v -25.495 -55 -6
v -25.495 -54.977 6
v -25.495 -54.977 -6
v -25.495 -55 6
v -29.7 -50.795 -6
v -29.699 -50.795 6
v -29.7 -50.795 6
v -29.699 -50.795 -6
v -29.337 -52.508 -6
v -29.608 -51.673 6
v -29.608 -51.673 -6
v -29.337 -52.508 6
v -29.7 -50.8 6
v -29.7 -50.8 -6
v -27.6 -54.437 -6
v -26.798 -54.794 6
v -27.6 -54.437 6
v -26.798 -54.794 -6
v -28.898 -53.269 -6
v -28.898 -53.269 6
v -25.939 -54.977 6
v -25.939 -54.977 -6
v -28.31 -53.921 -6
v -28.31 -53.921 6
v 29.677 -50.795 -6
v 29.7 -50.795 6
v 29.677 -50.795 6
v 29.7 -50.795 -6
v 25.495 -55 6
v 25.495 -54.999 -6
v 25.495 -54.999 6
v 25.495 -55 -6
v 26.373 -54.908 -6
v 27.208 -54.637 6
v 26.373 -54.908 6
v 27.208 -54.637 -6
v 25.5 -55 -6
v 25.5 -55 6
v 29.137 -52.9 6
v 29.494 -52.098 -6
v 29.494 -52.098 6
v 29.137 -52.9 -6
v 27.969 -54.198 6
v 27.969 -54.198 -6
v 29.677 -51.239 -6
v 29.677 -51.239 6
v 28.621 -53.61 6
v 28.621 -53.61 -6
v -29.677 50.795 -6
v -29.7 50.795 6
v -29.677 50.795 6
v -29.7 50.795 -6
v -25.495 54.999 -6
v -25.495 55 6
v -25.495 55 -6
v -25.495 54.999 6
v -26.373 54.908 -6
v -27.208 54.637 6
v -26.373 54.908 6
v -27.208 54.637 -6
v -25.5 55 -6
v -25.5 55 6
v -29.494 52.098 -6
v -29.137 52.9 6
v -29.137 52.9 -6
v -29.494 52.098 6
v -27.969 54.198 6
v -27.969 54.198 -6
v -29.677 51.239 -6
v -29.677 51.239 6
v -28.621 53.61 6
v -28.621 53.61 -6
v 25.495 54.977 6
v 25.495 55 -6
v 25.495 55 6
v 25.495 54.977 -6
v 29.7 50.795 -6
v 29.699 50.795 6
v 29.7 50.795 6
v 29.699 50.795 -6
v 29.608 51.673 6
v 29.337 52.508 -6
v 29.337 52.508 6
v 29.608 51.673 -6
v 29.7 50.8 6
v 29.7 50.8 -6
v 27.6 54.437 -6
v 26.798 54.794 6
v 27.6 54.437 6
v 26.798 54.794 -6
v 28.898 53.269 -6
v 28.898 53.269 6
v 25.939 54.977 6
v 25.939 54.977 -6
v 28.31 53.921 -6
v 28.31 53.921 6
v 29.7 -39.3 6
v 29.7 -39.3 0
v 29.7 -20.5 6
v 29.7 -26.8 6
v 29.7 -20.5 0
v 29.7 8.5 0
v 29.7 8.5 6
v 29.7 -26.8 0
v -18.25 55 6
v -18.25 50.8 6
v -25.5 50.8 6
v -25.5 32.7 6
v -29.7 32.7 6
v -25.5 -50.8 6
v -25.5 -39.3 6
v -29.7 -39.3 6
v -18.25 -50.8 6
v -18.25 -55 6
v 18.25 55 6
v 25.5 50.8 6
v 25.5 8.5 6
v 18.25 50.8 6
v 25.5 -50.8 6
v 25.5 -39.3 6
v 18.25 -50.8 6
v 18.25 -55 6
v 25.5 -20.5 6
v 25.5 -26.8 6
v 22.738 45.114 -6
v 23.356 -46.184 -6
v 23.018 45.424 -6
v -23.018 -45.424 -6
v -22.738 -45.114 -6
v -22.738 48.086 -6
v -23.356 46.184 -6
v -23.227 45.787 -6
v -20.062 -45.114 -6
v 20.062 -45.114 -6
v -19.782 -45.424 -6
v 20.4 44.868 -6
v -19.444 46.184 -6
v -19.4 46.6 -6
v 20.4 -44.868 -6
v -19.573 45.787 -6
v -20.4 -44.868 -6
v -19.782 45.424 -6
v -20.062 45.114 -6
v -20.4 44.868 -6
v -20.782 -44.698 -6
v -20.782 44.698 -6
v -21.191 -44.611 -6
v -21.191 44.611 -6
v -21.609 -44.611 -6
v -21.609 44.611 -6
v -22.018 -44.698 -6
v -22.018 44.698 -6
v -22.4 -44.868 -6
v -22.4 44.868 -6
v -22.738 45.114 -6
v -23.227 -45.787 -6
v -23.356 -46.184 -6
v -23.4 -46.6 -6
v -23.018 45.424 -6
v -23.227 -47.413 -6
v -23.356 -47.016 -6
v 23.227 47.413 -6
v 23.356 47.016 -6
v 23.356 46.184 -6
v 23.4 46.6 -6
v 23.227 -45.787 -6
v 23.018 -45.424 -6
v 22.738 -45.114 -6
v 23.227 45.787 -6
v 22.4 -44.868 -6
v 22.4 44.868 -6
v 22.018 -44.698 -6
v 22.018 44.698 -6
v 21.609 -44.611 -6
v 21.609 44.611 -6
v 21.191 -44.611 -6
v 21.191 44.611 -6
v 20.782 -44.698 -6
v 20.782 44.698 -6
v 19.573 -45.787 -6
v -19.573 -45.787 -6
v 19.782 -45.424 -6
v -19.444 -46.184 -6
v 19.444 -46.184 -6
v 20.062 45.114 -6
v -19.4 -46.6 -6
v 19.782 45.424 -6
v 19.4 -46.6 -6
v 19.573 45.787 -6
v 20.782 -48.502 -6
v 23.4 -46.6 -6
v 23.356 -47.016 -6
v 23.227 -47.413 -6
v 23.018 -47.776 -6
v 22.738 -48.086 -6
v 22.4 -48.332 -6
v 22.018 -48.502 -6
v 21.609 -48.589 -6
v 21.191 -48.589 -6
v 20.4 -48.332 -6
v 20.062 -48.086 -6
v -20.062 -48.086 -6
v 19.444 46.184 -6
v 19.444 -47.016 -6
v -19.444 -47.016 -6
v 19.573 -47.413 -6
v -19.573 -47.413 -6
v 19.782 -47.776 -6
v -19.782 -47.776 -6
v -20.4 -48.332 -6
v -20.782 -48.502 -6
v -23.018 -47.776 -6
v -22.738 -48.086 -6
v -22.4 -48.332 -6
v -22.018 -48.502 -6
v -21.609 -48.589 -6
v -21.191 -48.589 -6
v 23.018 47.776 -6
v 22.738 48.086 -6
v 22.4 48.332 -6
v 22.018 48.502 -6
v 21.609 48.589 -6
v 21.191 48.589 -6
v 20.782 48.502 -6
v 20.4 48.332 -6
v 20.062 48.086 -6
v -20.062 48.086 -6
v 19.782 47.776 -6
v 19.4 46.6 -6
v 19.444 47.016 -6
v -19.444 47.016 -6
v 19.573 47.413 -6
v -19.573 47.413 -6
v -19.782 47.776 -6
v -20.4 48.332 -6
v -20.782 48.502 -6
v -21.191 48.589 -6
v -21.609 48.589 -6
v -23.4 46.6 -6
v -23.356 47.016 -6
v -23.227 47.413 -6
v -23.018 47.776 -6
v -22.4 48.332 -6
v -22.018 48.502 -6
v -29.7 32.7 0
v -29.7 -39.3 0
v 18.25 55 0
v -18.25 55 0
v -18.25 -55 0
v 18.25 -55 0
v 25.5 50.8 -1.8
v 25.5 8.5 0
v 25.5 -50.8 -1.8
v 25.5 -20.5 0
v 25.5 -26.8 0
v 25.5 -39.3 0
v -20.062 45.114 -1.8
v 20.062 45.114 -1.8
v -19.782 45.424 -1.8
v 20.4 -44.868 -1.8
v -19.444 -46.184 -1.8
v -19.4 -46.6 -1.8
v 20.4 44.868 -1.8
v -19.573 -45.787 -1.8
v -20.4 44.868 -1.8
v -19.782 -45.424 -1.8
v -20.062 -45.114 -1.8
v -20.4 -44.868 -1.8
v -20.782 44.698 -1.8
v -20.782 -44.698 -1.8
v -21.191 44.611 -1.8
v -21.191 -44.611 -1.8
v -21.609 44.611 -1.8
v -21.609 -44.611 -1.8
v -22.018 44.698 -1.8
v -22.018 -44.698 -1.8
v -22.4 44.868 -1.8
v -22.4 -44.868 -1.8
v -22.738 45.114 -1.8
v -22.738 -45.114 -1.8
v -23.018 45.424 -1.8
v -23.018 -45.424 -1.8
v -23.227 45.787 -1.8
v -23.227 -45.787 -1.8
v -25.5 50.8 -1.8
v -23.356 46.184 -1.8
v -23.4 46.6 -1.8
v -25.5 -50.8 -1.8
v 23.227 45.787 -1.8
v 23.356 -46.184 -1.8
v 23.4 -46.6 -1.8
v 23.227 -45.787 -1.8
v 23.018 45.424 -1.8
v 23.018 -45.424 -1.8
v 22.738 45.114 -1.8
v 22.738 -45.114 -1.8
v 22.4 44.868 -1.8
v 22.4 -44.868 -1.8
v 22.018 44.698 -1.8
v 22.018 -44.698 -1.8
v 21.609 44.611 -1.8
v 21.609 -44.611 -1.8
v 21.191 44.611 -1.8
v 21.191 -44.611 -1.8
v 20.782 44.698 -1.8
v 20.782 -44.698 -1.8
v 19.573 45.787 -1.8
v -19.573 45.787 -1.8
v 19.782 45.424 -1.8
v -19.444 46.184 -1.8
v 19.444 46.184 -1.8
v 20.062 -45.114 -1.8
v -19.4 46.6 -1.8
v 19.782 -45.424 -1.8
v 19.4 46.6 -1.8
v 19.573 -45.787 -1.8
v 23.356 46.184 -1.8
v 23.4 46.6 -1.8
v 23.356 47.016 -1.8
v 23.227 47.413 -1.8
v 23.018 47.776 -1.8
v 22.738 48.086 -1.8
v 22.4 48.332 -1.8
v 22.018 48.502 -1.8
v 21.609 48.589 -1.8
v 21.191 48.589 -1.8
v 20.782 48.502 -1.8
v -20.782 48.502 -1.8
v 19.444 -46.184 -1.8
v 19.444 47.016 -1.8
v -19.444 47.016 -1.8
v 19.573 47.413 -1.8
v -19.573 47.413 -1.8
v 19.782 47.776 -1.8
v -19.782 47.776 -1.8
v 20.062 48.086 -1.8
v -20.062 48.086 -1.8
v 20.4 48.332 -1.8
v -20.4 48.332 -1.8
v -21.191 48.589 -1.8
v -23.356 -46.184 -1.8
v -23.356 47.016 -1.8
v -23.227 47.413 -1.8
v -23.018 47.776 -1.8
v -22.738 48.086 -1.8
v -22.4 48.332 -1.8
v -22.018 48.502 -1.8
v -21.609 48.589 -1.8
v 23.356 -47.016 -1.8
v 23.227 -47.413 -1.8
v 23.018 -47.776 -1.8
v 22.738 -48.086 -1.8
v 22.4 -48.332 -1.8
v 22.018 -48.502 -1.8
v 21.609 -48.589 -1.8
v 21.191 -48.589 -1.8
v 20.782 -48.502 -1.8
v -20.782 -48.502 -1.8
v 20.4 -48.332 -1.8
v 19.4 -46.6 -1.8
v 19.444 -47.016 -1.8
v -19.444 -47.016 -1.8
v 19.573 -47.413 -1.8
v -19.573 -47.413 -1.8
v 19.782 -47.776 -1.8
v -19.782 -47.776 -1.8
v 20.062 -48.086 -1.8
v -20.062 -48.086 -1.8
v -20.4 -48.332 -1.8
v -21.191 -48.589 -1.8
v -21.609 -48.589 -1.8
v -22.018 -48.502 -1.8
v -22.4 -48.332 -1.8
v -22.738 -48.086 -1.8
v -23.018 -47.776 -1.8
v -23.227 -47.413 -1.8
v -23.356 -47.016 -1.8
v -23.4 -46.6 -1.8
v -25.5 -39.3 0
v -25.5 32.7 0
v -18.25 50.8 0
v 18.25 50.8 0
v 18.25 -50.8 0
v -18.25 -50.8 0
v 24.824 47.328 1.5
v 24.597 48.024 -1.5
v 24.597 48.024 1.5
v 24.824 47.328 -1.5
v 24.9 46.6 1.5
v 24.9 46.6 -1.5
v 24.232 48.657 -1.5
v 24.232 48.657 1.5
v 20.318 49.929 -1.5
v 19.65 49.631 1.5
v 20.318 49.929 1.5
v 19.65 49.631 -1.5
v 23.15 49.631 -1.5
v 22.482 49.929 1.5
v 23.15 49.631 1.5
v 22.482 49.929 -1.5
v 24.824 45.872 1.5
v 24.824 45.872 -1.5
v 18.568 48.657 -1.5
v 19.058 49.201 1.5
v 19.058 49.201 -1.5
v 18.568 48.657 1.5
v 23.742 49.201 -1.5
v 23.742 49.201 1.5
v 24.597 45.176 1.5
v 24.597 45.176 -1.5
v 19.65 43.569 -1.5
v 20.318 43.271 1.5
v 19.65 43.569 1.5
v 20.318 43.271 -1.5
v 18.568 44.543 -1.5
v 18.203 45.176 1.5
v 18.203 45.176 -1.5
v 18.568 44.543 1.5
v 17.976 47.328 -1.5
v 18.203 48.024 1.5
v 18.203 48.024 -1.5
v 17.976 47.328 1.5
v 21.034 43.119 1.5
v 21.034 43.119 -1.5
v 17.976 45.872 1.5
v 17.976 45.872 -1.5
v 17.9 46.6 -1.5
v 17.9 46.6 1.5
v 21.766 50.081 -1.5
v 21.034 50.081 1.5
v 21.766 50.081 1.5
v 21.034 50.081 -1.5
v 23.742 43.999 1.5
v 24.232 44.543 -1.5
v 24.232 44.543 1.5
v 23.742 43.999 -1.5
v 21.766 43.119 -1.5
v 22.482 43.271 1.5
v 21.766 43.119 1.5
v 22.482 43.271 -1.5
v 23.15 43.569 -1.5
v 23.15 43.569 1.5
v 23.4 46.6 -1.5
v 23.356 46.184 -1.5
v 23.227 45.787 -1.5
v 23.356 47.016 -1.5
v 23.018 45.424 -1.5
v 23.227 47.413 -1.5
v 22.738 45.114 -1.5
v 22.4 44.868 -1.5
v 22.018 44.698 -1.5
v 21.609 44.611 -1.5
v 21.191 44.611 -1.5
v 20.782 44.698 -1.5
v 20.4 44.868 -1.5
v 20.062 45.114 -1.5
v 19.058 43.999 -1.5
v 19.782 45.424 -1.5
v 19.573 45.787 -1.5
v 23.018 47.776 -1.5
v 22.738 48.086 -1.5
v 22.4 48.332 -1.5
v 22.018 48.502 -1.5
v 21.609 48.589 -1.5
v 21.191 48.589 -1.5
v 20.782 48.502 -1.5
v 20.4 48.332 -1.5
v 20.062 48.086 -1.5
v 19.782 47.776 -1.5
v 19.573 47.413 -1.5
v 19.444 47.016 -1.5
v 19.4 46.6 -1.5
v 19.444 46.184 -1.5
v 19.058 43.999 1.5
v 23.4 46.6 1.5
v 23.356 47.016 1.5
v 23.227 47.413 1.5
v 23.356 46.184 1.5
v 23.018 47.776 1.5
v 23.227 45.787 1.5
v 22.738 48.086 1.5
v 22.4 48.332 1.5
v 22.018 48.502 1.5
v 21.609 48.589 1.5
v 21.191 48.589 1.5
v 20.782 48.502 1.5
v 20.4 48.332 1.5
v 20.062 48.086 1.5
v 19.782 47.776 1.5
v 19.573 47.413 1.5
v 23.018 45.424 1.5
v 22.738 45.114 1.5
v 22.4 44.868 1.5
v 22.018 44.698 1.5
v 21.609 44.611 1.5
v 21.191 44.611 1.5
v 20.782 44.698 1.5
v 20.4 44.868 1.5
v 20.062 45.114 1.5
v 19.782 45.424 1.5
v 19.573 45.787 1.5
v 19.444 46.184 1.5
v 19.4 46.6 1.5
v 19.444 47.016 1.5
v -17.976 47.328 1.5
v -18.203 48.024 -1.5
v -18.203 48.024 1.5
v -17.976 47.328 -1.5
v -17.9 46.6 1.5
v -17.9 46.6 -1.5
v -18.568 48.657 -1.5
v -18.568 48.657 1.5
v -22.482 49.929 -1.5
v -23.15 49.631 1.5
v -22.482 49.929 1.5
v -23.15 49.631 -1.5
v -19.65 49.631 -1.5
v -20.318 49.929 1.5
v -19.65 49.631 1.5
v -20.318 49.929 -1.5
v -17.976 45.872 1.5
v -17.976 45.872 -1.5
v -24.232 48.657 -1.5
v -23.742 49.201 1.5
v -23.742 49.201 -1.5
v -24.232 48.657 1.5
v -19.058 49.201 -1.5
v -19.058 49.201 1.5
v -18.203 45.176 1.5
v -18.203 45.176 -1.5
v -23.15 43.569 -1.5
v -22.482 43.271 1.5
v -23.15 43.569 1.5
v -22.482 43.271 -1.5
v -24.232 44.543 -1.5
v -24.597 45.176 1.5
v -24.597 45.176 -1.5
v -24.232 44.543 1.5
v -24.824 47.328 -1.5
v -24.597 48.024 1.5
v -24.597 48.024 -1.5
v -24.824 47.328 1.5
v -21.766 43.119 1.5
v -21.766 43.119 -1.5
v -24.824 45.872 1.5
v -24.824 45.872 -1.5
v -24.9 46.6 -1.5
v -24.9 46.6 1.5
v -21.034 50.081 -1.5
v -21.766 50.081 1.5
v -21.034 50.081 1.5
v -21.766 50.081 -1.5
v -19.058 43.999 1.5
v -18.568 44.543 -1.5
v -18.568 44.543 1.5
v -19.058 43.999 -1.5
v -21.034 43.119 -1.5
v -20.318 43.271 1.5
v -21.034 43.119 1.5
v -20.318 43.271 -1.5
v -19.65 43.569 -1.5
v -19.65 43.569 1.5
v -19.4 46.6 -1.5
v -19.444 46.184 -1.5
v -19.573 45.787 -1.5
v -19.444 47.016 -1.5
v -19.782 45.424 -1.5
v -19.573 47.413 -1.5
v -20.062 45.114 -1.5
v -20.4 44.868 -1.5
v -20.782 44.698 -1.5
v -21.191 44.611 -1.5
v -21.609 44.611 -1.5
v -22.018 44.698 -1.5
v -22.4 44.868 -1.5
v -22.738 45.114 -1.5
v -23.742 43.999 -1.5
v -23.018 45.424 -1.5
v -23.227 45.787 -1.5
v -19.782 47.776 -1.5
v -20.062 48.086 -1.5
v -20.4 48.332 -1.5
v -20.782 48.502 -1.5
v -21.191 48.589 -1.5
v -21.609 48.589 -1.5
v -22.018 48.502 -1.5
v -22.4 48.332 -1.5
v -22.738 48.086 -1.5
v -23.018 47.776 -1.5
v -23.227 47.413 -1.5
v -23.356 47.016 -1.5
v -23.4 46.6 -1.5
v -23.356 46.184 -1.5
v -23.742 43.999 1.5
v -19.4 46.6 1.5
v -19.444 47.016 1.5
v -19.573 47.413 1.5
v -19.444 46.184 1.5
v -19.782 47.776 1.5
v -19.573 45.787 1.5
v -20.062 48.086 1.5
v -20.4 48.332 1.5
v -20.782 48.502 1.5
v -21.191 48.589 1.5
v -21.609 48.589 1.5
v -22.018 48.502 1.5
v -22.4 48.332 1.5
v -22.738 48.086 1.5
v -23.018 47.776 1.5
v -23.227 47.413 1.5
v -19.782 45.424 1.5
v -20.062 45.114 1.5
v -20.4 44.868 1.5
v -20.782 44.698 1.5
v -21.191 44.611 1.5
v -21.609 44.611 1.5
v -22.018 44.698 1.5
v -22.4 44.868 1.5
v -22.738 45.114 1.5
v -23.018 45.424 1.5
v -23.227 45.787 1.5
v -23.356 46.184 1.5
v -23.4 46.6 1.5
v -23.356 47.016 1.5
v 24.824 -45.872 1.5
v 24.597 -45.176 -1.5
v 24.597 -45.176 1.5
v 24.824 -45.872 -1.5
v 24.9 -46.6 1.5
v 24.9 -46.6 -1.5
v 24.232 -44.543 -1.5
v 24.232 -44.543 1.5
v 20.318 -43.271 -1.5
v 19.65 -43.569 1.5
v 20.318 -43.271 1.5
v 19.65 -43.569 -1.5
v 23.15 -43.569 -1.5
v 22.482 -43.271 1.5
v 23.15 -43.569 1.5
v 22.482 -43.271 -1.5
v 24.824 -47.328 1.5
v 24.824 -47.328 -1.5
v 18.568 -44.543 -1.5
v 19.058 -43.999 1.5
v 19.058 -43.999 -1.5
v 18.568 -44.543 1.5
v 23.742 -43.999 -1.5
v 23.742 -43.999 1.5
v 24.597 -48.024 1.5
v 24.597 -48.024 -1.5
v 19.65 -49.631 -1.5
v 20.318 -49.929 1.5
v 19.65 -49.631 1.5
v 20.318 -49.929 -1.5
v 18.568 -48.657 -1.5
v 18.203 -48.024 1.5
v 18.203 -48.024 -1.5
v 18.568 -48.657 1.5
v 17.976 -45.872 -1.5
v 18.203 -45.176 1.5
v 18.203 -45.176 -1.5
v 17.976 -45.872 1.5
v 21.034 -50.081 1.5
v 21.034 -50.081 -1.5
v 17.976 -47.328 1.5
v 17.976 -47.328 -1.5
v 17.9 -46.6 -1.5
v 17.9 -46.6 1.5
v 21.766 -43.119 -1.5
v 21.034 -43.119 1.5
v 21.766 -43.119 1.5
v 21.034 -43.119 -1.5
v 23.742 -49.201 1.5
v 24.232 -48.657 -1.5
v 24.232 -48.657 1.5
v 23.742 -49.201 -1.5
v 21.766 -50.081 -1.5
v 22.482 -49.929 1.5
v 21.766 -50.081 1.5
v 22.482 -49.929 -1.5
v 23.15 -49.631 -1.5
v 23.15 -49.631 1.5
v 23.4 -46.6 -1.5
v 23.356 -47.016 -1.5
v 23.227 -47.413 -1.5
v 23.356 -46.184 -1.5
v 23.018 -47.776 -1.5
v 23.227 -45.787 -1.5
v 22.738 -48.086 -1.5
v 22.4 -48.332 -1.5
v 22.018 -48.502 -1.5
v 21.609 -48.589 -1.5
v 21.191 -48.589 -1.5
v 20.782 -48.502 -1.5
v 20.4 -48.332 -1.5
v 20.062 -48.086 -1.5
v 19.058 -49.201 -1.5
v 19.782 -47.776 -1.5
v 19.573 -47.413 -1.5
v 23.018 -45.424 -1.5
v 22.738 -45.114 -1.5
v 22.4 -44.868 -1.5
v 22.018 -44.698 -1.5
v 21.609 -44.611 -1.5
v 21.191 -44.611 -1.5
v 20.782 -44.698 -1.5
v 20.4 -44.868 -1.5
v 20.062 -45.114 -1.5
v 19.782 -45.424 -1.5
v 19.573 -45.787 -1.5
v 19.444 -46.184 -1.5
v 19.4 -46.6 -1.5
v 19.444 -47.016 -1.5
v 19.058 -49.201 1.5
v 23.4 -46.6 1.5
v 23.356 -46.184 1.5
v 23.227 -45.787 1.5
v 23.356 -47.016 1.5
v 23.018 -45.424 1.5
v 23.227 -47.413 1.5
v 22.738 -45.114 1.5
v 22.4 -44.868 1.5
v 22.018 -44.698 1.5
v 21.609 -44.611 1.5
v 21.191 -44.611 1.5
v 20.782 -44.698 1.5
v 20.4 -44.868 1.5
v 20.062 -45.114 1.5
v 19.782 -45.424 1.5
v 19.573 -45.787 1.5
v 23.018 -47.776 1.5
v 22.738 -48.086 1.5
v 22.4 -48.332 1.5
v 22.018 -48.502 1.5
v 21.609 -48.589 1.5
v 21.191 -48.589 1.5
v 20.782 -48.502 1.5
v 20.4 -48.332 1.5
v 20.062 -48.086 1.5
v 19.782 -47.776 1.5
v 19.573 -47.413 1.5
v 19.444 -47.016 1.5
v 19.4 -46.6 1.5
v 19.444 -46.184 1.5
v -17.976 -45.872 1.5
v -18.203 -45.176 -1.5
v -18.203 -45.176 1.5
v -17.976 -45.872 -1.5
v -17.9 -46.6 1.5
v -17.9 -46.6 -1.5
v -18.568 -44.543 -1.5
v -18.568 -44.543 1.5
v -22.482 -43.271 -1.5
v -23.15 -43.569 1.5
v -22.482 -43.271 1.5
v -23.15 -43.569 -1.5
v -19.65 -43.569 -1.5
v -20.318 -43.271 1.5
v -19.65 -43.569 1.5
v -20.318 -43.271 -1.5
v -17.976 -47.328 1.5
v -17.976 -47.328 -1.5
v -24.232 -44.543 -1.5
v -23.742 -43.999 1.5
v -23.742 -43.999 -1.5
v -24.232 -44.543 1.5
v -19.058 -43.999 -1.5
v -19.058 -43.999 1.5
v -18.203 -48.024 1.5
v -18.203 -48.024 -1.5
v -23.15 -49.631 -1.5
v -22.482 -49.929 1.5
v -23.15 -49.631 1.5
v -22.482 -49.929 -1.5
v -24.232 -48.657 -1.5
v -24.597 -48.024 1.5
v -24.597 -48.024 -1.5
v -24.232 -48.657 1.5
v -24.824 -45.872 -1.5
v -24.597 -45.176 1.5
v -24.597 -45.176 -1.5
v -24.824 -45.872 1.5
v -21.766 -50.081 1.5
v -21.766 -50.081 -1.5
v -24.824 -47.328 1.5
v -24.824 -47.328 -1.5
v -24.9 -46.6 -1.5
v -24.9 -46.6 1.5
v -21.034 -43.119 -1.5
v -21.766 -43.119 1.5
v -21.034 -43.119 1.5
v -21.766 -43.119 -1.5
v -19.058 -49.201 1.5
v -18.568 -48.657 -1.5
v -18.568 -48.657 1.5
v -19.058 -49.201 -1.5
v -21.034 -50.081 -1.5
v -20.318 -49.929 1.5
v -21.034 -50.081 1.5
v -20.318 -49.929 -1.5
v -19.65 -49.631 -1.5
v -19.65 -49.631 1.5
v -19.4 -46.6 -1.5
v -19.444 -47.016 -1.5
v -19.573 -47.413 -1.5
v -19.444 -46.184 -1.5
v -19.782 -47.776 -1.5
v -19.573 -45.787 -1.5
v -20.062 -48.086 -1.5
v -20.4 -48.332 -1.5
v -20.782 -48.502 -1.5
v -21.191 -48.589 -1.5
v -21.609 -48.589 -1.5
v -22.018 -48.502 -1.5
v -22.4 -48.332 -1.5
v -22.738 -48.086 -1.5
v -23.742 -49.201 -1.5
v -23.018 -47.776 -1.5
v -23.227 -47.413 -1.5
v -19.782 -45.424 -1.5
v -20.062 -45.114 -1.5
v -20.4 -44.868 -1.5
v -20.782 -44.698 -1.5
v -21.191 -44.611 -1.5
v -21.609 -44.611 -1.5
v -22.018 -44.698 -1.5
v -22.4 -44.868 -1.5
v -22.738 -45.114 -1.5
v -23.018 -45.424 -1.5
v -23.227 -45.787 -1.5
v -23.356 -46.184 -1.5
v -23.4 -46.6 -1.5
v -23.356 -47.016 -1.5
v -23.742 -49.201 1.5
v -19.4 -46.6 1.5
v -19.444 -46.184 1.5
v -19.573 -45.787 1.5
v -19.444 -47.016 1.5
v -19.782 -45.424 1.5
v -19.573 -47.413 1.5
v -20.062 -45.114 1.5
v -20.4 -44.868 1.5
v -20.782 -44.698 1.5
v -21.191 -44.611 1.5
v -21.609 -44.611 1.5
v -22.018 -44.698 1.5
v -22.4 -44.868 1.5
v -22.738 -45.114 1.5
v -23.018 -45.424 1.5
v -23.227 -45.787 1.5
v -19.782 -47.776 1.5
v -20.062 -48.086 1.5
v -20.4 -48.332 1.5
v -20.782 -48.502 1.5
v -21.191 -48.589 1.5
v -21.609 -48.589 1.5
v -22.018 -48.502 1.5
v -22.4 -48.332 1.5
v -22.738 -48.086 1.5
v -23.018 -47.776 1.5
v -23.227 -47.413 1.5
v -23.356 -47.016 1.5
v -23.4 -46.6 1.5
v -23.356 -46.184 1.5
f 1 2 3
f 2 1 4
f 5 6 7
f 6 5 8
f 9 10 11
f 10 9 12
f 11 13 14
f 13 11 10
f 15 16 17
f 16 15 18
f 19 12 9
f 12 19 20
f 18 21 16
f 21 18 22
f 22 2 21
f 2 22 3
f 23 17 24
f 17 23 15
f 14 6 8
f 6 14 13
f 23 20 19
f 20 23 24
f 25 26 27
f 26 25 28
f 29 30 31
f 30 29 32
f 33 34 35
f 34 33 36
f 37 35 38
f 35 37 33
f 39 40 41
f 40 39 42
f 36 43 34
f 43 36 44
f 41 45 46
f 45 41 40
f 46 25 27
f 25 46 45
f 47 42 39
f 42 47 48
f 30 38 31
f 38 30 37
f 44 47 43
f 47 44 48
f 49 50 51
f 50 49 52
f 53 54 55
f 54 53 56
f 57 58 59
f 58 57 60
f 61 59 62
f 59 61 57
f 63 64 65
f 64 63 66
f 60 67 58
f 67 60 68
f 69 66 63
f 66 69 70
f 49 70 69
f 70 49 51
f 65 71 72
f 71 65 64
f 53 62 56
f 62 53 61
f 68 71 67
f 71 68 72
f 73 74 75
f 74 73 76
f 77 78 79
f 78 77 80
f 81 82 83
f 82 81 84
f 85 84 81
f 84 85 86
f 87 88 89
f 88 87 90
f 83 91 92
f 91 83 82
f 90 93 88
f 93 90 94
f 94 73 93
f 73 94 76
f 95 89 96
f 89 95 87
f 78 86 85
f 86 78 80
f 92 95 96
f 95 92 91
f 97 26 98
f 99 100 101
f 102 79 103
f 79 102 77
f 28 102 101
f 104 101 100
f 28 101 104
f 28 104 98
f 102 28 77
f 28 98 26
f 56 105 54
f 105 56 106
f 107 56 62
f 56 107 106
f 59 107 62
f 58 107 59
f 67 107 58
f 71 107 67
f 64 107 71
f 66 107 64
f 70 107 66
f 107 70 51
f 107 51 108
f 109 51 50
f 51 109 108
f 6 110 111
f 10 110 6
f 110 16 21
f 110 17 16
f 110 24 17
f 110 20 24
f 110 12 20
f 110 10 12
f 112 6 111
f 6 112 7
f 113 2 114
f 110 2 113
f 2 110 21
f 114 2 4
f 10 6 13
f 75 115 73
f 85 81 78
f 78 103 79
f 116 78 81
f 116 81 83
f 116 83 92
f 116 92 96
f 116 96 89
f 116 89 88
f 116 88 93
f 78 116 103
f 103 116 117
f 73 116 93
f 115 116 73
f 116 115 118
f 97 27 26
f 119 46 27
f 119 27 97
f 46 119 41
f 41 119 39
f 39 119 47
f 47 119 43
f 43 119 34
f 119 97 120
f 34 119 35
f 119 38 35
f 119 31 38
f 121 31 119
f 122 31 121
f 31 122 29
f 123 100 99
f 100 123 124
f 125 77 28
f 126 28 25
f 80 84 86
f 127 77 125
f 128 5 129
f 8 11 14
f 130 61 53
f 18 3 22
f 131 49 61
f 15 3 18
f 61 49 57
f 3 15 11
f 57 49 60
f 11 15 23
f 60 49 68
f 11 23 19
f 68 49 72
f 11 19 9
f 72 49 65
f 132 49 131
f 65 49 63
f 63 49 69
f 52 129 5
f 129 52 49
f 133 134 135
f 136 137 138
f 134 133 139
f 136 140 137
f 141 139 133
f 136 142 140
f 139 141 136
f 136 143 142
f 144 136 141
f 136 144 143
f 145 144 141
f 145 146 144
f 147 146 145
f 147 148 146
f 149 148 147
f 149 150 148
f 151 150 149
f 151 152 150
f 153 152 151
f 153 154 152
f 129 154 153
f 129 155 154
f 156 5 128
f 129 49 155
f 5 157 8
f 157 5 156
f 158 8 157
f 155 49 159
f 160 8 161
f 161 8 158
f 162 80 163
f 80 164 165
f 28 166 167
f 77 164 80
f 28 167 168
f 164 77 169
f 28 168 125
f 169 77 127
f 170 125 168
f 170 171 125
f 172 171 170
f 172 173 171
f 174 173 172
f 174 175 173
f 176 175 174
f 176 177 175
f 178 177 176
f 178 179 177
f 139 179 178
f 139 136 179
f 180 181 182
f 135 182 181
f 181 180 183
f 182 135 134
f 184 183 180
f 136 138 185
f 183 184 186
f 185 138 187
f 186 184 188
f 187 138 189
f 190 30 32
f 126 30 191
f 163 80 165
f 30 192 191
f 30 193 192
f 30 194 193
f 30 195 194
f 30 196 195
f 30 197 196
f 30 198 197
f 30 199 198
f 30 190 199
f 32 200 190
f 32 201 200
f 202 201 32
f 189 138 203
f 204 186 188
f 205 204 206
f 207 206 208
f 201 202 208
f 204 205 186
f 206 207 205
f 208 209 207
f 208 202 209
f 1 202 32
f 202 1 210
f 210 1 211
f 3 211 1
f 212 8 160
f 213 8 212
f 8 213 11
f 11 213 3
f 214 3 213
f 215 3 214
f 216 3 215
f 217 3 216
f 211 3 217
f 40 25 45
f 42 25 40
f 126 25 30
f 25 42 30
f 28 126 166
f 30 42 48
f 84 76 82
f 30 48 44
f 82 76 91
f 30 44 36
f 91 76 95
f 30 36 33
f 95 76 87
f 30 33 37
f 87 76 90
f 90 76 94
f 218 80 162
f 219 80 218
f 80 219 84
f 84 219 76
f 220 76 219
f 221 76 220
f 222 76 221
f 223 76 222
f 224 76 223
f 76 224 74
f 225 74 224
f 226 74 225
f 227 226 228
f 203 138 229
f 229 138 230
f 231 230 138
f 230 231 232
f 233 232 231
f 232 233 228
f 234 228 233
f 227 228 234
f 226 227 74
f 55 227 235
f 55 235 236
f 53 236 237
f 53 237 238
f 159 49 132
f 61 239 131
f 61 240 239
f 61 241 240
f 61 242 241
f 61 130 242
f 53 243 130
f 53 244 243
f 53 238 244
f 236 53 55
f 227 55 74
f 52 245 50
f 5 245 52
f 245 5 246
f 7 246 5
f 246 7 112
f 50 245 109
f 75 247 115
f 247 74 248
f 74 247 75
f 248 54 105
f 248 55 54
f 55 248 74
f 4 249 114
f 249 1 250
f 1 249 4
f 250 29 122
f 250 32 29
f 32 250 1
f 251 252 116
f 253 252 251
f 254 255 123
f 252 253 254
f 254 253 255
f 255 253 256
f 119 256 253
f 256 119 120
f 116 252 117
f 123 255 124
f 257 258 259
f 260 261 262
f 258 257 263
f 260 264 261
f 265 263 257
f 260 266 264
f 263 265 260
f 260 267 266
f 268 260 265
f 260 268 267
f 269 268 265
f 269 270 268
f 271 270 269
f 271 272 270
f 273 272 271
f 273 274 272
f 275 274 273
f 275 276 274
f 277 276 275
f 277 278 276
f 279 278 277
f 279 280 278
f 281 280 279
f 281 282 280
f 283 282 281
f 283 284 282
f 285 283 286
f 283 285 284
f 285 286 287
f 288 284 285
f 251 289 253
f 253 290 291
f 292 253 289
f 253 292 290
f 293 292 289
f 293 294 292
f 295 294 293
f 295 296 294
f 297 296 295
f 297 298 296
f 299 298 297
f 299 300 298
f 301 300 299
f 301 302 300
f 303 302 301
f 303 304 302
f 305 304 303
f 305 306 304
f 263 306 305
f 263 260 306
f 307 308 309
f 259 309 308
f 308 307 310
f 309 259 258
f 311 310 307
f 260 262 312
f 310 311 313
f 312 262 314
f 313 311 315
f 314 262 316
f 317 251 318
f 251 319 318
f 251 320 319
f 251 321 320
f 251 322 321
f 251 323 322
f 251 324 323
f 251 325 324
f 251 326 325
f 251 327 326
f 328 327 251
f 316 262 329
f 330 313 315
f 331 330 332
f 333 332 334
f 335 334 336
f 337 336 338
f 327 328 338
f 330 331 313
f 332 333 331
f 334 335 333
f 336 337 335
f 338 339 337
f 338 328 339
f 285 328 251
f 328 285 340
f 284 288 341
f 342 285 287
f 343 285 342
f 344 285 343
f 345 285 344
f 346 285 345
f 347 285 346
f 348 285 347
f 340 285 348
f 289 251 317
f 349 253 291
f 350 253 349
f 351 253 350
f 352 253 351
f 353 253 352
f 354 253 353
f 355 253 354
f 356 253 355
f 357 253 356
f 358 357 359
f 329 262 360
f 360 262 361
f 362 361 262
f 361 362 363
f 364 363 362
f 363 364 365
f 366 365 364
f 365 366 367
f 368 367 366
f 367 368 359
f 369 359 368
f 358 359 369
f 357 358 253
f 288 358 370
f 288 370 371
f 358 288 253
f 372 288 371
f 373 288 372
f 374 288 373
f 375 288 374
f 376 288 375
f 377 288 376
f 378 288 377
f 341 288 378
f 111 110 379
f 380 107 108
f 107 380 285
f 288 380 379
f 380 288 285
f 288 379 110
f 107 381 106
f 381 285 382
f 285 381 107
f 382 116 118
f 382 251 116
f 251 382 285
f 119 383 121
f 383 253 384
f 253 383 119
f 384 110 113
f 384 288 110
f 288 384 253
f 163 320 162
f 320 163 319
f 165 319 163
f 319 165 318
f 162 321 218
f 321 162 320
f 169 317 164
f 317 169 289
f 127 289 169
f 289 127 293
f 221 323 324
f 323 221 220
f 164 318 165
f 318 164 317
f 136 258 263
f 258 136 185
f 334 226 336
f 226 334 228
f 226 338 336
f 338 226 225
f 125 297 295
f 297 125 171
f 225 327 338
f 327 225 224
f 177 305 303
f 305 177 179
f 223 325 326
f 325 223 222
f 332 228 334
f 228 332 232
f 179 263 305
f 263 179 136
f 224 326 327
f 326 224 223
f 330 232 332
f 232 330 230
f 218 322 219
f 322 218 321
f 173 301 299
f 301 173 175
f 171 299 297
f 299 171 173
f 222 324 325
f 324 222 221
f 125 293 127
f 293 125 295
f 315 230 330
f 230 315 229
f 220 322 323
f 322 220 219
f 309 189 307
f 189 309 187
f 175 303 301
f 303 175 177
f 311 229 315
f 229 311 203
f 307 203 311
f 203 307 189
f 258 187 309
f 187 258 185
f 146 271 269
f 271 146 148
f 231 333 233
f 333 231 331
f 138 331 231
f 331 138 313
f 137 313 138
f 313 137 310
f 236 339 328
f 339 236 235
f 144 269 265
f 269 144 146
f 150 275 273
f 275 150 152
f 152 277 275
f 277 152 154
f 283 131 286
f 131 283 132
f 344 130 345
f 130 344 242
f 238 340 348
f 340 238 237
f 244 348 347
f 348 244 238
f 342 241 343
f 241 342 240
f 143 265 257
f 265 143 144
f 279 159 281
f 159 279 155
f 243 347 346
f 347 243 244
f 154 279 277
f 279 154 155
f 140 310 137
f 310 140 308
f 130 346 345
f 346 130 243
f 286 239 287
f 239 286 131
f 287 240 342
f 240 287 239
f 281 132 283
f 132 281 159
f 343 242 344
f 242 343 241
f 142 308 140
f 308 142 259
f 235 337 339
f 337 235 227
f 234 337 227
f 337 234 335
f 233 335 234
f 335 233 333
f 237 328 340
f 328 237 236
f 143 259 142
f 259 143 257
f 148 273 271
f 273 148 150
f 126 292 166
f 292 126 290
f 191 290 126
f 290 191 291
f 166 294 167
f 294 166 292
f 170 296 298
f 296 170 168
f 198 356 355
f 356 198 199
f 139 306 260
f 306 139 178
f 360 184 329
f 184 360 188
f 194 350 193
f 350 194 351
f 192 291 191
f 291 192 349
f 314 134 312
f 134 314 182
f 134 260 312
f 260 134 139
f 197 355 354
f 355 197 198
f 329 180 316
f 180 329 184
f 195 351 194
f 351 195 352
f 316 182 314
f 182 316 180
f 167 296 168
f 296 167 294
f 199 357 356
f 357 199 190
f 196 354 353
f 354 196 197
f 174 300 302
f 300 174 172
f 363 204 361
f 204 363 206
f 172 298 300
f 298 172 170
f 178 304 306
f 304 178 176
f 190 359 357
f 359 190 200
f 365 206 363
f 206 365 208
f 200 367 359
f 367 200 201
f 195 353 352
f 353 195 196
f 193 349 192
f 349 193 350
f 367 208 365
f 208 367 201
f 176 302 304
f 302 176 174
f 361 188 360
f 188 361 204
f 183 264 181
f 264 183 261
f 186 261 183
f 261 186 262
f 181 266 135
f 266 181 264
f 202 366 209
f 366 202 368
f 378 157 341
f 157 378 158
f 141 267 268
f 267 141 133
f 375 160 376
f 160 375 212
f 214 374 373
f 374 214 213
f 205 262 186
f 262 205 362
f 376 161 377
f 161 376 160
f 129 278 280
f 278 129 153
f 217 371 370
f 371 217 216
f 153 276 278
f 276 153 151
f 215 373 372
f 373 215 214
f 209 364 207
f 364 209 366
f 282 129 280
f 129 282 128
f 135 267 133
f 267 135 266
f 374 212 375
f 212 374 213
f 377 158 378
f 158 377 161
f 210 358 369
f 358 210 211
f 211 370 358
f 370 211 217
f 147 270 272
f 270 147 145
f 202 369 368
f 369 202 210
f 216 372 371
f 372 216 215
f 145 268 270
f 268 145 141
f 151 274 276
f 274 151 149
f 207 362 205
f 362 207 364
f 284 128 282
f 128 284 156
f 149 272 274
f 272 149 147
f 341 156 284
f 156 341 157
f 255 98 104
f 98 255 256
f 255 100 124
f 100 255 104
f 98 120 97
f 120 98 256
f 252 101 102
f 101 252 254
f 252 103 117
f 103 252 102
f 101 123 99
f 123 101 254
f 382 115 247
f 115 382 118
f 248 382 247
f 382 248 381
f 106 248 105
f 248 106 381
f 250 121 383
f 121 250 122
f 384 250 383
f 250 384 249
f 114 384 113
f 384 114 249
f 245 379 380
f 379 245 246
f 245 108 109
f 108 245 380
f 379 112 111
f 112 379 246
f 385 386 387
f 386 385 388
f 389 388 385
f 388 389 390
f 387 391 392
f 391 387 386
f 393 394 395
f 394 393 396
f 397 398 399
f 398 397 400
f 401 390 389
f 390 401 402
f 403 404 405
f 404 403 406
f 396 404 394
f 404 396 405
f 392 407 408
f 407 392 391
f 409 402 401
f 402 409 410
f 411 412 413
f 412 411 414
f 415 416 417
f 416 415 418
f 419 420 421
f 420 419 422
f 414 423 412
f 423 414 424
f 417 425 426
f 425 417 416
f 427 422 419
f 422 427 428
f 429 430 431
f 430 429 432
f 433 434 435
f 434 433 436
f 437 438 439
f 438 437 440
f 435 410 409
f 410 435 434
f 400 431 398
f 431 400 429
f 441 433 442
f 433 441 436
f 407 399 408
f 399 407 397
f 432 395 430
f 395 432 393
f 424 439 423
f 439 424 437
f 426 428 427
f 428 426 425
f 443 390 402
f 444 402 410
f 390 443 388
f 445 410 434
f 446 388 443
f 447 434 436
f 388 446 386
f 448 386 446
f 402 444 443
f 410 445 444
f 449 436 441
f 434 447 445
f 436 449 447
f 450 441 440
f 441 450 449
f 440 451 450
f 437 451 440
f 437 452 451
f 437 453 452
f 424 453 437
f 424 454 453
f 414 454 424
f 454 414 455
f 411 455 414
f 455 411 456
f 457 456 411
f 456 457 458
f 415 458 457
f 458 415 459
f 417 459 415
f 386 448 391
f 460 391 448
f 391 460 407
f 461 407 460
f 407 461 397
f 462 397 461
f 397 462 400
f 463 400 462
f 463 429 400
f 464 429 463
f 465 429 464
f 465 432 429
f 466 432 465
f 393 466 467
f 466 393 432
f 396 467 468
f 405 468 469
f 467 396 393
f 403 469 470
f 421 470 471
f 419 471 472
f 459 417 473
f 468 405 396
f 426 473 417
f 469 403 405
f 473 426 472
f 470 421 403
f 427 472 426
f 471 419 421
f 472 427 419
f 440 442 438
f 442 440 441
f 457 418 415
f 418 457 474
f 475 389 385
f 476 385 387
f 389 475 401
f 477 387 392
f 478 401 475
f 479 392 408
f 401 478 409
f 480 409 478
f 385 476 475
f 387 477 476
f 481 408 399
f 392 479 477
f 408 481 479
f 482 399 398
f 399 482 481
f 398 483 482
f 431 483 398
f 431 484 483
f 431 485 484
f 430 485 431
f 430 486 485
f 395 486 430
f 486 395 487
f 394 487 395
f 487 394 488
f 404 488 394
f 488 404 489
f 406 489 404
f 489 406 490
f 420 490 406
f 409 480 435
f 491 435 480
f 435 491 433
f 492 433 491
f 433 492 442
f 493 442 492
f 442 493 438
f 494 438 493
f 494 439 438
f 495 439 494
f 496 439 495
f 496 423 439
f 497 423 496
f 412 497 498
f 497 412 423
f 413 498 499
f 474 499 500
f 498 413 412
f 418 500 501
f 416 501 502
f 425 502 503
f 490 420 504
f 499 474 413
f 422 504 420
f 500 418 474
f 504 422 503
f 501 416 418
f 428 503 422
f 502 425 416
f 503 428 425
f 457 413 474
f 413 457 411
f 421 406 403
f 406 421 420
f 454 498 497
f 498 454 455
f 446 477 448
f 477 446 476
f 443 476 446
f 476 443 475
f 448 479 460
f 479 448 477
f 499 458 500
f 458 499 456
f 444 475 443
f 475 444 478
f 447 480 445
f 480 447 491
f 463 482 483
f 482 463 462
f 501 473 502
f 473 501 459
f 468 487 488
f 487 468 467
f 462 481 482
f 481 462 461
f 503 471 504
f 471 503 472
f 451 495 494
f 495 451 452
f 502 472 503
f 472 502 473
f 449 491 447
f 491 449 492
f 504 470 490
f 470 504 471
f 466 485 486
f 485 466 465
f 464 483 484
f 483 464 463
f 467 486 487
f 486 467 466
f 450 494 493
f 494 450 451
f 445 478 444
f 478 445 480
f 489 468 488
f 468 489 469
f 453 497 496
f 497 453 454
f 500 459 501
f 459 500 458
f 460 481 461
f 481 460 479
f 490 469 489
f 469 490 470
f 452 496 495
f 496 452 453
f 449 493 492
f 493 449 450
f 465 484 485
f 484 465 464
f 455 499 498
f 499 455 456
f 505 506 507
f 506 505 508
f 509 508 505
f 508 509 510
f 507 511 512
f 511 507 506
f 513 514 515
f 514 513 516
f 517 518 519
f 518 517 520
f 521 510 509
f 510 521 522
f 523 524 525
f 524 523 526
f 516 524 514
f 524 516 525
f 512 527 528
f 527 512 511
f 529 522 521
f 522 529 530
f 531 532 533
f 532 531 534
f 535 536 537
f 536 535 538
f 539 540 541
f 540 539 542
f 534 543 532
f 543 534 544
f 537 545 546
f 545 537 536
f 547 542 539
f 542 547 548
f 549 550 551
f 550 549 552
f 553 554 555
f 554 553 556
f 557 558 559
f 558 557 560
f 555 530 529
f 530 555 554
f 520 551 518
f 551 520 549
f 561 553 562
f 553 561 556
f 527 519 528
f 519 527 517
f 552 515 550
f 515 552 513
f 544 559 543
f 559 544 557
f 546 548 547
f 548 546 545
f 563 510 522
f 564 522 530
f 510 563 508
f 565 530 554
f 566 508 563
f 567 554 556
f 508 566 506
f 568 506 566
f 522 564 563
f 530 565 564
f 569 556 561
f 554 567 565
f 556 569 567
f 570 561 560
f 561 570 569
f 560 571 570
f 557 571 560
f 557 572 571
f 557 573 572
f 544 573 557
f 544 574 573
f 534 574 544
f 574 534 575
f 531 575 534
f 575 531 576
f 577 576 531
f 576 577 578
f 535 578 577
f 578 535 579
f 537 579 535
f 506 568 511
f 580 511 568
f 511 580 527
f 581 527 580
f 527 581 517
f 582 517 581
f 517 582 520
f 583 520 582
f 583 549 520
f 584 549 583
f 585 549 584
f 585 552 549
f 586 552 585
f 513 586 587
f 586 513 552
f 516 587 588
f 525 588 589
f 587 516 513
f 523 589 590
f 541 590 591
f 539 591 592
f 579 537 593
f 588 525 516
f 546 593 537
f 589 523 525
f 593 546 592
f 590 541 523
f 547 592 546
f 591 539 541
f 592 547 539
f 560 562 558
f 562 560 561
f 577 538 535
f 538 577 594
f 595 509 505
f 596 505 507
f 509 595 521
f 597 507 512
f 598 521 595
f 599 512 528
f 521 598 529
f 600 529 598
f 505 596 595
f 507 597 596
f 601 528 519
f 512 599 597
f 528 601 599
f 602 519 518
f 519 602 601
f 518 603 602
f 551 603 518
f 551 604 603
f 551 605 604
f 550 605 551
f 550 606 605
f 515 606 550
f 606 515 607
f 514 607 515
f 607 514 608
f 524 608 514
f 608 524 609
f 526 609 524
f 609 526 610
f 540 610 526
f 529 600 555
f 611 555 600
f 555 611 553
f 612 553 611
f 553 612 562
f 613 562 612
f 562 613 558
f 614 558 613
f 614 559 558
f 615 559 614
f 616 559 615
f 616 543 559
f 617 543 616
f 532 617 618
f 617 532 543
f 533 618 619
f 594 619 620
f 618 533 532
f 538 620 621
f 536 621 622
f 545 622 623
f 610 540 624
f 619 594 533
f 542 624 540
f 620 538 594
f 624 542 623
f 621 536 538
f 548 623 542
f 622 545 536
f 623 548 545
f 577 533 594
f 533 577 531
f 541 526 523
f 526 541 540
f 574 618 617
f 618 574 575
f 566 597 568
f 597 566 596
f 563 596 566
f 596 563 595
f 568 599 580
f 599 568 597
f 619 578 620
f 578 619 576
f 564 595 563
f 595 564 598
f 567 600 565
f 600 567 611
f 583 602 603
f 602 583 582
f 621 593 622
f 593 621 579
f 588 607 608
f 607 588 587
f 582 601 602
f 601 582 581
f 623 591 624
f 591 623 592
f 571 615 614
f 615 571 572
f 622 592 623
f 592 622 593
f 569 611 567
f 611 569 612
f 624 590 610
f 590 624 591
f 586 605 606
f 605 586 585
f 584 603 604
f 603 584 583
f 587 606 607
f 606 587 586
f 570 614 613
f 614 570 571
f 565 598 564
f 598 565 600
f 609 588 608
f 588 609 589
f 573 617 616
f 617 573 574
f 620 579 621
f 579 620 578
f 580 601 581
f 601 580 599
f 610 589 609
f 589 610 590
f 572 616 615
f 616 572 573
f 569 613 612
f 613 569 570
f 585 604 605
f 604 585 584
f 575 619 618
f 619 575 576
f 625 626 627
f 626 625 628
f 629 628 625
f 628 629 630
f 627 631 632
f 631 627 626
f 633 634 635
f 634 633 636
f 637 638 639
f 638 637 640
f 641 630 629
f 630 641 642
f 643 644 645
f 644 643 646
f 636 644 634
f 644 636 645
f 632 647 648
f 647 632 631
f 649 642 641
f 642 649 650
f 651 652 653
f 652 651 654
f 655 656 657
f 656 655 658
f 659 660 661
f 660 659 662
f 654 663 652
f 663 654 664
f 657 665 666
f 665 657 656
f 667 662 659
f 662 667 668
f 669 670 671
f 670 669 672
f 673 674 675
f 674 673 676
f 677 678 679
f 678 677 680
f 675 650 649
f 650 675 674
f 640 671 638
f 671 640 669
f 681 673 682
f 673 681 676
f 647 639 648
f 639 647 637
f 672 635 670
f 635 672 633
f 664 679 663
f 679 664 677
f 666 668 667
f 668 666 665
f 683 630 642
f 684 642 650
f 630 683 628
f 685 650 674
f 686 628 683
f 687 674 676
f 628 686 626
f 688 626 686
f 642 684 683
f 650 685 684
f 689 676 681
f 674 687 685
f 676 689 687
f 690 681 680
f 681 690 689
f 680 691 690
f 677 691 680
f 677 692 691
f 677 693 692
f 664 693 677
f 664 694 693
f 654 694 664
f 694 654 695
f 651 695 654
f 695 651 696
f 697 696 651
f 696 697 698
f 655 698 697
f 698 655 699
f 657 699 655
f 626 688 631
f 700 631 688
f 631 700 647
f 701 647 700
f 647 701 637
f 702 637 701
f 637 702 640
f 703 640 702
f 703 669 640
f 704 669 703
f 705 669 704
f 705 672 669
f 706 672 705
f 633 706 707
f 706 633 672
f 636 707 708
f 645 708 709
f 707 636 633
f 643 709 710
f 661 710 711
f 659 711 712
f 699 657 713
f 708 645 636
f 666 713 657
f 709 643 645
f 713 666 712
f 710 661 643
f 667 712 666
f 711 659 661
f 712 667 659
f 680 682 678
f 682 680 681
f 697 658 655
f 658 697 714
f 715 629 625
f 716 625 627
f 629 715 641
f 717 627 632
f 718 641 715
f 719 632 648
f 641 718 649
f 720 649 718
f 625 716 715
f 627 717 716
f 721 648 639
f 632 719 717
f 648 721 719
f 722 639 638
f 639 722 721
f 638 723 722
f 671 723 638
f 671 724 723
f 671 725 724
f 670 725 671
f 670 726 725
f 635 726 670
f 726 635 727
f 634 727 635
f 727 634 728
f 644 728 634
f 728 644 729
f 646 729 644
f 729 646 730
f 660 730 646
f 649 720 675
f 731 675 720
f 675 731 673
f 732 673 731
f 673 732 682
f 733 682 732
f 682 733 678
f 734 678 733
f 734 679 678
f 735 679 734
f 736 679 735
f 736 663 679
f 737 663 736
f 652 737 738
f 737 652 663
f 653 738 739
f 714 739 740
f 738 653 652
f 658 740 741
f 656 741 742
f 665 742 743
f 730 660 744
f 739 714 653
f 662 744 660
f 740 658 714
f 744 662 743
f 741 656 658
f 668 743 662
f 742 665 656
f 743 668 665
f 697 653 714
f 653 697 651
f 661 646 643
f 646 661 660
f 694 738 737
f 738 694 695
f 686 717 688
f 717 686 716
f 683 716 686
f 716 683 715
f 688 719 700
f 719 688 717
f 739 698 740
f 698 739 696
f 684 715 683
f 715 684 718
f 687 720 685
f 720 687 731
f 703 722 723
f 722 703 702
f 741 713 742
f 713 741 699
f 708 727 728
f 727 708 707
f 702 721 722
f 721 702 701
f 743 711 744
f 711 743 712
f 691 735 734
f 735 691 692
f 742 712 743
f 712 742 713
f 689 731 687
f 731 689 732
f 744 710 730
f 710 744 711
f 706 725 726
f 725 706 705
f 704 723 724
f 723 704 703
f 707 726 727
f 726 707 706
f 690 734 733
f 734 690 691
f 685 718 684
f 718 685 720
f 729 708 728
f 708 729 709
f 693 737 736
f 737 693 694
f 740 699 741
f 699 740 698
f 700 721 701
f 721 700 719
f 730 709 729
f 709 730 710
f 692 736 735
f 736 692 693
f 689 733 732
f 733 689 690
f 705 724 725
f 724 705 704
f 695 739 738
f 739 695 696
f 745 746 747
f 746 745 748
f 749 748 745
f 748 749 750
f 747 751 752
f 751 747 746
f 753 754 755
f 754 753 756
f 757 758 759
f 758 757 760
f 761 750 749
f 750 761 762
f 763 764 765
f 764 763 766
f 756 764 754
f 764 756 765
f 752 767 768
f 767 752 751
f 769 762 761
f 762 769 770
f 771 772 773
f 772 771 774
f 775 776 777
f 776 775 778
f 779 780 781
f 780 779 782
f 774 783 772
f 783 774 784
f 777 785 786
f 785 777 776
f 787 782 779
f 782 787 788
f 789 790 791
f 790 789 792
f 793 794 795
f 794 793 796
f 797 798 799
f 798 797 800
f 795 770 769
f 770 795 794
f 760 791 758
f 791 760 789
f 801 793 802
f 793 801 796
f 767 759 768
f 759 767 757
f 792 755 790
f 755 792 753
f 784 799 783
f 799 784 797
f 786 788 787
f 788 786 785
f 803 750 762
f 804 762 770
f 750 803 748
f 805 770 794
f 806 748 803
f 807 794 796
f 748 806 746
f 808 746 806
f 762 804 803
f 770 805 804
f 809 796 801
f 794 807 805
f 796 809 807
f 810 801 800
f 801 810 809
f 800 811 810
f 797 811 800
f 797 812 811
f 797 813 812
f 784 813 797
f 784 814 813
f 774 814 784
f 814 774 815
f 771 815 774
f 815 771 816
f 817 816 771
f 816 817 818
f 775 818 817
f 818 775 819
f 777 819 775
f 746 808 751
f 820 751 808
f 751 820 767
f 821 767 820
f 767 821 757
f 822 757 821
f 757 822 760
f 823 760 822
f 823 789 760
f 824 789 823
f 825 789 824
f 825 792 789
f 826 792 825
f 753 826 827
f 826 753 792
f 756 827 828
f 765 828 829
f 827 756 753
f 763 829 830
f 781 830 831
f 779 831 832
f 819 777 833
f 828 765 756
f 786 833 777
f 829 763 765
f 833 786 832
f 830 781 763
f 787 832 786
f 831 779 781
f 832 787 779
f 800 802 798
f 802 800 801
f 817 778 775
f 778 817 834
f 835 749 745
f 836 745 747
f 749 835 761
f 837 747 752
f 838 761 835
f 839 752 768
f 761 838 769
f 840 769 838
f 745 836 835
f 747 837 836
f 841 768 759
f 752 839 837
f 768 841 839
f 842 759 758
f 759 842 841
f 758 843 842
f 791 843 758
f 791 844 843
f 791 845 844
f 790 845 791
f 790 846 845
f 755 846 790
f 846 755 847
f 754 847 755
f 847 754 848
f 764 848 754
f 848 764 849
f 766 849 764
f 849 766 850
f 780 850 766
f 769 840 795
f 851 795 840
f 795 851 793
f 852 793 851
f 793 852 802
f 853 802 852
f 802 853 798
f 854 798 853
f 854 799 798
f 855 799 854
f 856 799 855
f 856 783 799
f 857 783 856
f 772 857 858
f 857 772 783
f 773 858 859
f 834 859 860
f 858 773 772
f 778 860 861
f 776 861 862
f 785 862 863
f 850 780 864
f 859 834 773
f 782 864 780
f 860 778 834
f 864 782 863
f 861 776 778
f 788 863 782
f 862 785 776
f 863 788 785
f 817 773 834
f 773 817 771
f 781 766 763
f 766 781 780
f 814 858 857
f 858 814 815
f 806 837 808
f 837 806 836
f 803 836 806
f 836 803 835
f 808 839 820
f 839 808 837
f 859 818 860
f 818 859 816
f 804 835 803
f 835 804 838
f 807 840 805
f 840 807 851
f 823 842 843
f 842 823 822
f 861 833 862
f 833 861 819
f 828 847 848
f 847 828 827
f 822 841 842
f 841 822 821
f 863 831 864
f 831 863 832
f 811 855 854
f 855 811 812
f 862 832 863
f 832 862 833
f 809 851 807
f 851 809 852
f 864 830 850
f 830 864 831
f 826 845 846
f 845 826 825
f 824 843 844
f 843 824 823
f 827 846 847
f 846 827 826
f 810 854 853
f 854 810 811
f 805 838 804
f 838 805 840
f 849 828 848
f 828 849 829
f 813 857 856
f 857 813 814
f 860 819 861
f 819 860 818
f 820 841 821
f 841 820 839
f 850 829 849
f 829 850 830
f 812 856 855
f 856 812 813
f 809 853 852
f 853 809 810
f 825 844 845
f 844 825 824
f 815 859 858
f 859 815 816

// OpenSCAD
walls_thickness=4.2;
max_inner_height=30;
bottom_height=12;
top_height= 10;

pcb_feet_height=3;
top_bottom_thickness = 3;


//v1.3a
pcb_length =101.6;
pcb_width=51.0;
mount_holes_x_dist = 42.8;
mount_holes_y_dist = 93.2;
mount_holes_dia=4;
stepper_connectors_dist=10;

usb_conn_height=10.5;
usb_conn_width=12.5;
usb_conn_dist_totop =11.5;

xstop_to_usb=6.3;
tripple_connector_width=7.70;
connectors_height= 7.1;
endstops_total=29;
therms_total=12.5;
border_to_therm=12;
border_to_steppers=17.5;
steppers_total = 72;

front_and_back=36.5;
//general
$fn=30;
h_extra = 0.02;


enclosure_bottom();

//
module enclosure_bottom(bottom=true)
{
	pcb_top_y_pos =-pcb_length/2;
	pcb_bot_y_pos = pcb_length/2;

	difference()
	{
		union()
		{
			cube([pcb_width+walls_thickness*2, pcb_length+walls_thickness*2, bottom_height], center=true);

		}

		translate([0,0,walls_thickness]) cube([pcb_width, pcb_length, bottom_height], center=true);

		//roundings
		translate([-pcb_width/2-walls_thickness/2,-pcb_length/2-walls_thickness/2,0]) rotate([0,0,180])corner_rounding(walls_thickness,bottom_height,0.01);
		translate([pcb_width/2+walls_thickness/2,-pcb_length/2-walls_thickness/2,0]) rotate([0,0,270])corner_rounding(walls_thickness,bottom_height,0.01);

		translate([-pcb_width/2-walls_thickness/2,pcb_length/2+walls_thickness/2,0]) rotate([0,0,90])corner_rounding(walls_thickness,bottom_height,0.01);
		translate([pcb_width/2+walls_thickness/2,pcb_length/2+walls_thickness/2,0]) rotate([0,0,0])corner_rounding(walls_thickness,bottom_height,0.01);


		//pcb mount holes
		translate([mount_holes_x_dist/2,mount_holes_y_dist/2,0]) cylinder(h=50, r=mount_holes_dia/2, center=true);
		translate([-mount_holes_x_dist/2,mount_holes_y_dist/2,0]) cylinder(h=50, r=mount_holes_dia/2, center=true);

		translate([mount_holes_x_dist/2,-mount_holes_y_dist/2,0]) cylinder(h=50, r=mount_holes_dia/2, center=true);
		translate([-mount_holes_x_dist/2,-mount_holes_y_dist/2,0]) cylinder(h=50, r=mount_holes_dia/2, center=true);

		//connector_holes
		//usb
		translate([pcb_width/2,pcb_top_y_pos+usb_conn_dist_totop,0])  cube([walls_thickness+h_extra, usb_conn_width, usb_conn_height]);
		//xendstop
		translate([pcb_width/2,pcb_top_y_pos+usb_conn_dist_totop+xstop_to_usb+usb_conn_width,0])  cube([walls_thickness+h_extra, endstops_total, connectors_height]);
		//thermistors & heaters
		translate([-front_and_back/2,pcb_bot_y_pos,0])  cube([front_and_back, walls_thickness+h_extra, connectors_height]);
		translate([-front_and_back/2,pcb_top_y_pos-walls_thickness,0])  cube([front_and_back, walls_thickness+h_extra, connectors_height]);
		//steppers
		translate([-pcb_width/2-walls_thickness,pcb_top_y_pos+usb_conn_dist_totop,0])  cube([walls_thickness+h_extra, steppers_total, connectors_height]);
		
	}
	//pcb feet
	translate([mount_holes_x_dist/2,mount_holes_y_dist/2,0])  _pcb_feet() ;
	translate([-mount_holes_x_dist/2,mount_holes_y_dist/2,0])  _pcb_feet() ;
	translate([mount_holes_x_dist/2,-mount_holes_y_dist/2,0]) _pcb_feet() ;
	translate([-mount_holes_x_dist/2,-mount_holes_y_dist/2,0]) _pcb_feet() ;

		
}

module _pcb_feet()
{
	difference()
	{
		cylinder(h=pcb_feet_height, r=mount_holes_dia/2+1.5, center=true);
		 cylinder(h=pcb_feet_height+h_extra, r=mount_holes_dia/2, center=true);
	}
}


module corner_rounding(width,height, extra=0)
{
	//translate([-width/2,-width/2,,0])
	difference()
	{
		cube([width+extra,width+extra,height+extra], center=true);
		 translate([-width/2,-width/2,0]) cylinder(h=(height+extra), r=width, center=true);
		
	}
}
